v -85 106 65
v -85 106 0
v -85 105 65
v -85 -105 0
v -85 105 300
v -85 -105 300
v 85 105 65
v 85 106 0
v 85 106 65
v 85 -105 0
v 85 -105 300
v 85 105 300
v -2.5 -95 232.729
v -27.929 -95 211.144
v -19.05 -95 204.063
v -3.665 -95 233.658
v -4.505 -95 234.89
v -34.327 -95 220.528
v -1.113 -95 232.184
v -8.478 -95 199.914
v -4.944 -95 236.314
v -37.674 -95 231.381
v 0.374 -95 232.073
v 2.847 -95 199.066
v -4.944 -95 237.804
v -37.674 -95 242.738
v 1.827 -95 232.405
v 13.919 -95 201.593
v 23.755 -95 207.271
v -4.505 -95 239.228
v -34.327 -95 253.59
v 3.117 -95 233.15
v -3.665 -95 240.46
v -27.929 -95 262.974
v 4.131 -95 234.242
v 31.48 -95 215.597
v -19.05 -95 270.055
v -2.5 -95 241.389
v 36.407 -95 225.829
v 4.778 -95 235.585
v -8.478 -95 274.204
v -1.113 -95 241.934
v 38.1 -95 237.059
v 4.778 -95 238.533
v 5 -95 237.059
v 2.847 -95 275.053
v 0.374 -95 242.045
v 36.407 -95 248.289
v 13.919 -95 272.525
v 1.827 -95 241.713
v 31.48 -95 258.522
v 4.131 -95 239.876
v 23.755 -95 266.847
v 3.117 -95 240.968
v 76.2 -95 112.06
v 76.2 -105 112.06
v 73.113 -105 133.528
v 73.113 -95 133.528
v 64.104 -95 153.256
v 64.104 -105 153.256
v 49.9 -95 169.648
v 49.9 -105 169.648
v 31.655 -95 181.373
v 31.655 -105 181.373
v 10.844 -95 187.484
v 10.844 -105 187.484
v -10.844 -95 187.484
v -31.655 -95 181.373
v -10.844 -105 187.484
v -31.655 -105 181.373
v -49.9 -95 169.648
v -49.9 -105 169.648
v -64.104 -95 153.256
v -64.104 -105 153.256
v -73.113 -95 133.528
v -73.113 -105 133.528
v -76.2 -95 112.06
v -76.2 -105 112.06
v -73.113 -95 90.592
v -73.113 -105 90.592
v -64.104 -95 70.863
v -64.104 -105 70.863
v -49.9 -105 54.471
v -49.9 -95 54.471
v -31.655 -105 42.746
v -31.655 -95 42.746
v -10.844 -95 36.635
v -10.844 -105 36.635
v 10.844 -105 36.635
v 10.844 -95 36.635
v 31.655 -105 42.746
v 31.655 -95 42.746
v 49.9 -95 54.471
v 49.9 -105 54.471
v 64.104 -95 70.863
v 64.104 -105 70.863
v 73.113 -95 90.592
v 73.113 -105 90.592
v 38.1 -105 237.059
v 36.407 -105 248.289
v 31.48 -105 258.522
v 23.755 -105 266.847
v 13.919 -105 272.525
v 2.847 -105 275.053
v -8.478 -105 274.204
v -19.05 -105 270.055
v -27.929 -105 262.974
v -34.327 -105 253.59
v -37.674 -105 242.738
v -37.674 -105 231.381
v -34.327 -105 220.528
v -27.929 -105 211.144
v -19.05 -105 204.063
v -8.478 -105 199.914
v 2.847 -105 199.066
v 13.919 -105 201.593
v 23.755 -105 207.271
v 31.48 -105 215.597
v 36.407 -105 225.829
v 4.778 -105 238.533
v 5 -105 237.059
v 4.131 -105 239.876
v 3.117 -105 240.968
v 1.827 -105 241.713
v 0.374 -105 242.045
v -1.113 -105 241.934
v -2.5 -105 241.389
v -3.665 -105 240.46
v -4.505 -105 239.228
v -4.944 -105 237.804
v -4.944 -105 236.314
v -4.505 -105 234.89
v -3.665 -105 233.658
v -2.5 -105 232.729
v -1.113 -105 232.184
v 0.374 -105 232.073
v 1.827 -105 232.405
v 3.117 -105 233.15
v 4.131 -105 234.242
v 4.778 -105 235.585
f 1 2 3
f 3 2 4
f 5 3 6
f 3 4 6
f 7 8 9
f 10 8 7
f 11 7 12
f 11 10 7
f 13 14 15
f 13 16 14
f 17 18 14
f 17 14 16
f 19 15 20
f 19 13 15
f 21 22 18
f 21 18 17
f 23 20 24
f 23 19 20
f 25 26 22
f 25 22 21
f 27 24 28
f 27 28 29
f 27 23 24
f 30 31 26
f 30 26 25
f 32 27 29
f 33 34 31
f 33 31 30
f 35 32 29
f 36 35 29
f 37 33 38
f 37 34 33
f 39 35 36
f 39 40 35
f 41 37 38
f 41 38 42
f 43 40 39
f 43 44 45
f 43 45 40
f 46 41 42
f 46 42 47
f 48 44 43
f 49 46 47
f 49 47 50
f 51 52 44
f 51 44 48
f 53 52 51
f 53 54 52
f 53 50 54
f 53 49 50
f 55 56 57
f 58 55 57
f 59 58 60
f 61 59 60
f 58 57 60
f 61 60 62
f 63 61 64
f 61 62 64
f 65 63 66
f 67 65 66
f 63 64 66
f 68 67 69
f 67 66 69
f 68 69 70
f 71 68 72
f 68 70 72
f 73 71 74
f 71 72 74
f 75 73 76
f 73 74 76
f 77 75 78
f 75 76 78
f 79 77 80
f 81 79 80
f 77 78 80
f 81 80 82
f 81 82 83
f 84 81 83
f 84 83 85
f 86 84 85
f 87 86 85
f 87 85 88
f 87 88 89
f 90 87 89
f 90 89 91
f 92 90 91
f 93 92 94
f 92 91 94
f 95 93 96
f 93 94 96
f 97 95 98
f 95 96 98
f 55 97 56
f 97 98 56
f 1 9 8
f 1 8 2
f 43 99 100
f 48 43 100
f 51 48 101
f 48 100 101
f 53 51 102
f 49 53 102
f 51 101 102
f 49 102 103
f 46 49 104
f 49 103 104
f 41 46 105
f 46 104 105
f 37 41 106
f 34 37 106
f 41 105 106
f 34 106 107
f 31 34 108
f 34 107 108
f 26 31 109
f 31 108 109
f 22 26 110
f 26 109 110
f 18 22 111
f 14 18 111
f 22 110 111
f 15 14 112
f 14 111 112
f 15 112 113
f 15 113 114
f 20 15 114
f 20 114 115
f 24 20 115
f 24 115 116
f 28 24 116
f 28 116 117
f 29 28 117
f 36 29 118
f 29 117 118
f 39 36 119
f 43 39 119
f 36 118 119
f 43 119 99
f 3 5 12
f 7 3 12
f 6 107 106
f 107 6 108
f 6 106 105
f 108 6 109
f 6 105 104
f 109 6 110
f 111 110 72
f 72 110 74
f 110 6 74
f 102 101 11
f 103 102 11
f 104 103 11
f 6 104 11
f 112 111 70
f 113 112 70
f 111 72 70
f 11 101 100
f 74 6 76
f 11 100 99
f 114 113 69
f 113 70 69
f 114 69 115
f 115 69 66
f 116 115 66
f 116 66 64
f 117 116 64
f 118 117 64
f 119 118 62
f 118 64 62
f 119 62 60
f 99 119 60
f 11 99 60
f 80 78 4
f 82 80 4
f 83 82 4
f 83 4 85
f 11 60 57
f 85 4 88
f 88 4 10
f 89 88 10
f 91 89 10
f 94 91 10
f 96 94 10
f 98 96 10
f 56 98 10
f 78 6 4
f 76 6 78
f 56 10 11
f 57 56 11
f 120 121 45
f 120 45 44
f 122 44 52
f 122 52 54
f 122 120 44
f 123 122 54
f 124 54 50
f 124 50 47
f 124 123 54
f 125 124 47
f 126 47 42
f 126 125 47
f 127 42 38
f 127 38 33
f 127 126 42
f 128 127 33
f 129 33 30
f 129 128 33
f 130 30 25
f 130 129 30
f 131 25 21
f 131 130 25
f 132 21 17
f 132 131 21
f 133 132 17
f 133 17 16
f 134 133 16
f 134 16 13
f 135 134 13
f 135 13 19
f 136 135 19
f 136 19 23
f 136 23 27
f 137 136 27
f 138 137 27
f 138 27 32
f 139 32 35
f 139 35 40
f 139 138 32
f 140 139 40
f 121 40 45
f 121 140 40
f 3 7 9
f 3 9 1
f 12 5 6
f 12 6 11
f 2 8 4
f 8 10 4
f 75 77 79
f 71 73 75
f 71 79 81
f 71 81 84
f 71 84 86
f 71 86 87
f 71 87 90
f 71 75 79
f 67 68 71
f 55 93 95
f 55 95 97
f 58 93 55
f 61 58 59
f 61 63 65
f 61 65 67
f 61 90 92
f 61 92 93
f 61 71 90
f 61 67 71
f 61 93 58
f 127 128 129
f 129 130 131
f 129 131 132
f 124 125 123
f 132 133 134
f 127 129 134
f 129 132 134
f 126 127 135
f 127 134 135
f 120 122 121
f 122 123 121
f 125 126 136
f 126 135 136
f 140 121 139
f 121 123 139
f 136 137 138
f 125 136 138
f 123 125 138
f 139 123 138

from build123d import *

# Parameters (mm, degrees)
F0_W     = 170
F0_H     = 210
F1_DEPTH = 300
F2_W     = 170
F2_H     = 65
F3_DEPTH = 1
F4_R     = 38.1
F4_R_2   = 5
F4_R_3   = 76.2
F5_DEPTH = 10


with BuildPart() as f1:
    # F0 (on Top) → F1 (new body)
    with BuildSketch(Plane.XY):
        Rectangle(F0_W, F0_H)
    extrude(amount=F1_DEPTH)

    # F2 (on face) → F3 (join)
    with BuildSketch(Plane(origin=(0, 105, 0), x_dir=(-1, 0, 0), z_dir=(0, 1, 0))):
        with Locations((0, 32.5)):
            Rectangle(F2_W, F2_H)
    extrude(amount=F3_DEPTH)

    # F4 (on face) → F5 (cut)
    with BuildSketch(Plane.XZ.offset(105)):
        with Locations((0, 237.059057)):
            Circle(F4_R)
        with Locations((0, 237.059057)):
            Circle(F4_R_2, mode=Mode.SUBTRACT)
        with Locations((0, 112.059531)):
            Circle(F4_R_3)
    extrude(amount=-F5_DEPTH, mode=Mode.SUBTRACT)


solid = f1.part
